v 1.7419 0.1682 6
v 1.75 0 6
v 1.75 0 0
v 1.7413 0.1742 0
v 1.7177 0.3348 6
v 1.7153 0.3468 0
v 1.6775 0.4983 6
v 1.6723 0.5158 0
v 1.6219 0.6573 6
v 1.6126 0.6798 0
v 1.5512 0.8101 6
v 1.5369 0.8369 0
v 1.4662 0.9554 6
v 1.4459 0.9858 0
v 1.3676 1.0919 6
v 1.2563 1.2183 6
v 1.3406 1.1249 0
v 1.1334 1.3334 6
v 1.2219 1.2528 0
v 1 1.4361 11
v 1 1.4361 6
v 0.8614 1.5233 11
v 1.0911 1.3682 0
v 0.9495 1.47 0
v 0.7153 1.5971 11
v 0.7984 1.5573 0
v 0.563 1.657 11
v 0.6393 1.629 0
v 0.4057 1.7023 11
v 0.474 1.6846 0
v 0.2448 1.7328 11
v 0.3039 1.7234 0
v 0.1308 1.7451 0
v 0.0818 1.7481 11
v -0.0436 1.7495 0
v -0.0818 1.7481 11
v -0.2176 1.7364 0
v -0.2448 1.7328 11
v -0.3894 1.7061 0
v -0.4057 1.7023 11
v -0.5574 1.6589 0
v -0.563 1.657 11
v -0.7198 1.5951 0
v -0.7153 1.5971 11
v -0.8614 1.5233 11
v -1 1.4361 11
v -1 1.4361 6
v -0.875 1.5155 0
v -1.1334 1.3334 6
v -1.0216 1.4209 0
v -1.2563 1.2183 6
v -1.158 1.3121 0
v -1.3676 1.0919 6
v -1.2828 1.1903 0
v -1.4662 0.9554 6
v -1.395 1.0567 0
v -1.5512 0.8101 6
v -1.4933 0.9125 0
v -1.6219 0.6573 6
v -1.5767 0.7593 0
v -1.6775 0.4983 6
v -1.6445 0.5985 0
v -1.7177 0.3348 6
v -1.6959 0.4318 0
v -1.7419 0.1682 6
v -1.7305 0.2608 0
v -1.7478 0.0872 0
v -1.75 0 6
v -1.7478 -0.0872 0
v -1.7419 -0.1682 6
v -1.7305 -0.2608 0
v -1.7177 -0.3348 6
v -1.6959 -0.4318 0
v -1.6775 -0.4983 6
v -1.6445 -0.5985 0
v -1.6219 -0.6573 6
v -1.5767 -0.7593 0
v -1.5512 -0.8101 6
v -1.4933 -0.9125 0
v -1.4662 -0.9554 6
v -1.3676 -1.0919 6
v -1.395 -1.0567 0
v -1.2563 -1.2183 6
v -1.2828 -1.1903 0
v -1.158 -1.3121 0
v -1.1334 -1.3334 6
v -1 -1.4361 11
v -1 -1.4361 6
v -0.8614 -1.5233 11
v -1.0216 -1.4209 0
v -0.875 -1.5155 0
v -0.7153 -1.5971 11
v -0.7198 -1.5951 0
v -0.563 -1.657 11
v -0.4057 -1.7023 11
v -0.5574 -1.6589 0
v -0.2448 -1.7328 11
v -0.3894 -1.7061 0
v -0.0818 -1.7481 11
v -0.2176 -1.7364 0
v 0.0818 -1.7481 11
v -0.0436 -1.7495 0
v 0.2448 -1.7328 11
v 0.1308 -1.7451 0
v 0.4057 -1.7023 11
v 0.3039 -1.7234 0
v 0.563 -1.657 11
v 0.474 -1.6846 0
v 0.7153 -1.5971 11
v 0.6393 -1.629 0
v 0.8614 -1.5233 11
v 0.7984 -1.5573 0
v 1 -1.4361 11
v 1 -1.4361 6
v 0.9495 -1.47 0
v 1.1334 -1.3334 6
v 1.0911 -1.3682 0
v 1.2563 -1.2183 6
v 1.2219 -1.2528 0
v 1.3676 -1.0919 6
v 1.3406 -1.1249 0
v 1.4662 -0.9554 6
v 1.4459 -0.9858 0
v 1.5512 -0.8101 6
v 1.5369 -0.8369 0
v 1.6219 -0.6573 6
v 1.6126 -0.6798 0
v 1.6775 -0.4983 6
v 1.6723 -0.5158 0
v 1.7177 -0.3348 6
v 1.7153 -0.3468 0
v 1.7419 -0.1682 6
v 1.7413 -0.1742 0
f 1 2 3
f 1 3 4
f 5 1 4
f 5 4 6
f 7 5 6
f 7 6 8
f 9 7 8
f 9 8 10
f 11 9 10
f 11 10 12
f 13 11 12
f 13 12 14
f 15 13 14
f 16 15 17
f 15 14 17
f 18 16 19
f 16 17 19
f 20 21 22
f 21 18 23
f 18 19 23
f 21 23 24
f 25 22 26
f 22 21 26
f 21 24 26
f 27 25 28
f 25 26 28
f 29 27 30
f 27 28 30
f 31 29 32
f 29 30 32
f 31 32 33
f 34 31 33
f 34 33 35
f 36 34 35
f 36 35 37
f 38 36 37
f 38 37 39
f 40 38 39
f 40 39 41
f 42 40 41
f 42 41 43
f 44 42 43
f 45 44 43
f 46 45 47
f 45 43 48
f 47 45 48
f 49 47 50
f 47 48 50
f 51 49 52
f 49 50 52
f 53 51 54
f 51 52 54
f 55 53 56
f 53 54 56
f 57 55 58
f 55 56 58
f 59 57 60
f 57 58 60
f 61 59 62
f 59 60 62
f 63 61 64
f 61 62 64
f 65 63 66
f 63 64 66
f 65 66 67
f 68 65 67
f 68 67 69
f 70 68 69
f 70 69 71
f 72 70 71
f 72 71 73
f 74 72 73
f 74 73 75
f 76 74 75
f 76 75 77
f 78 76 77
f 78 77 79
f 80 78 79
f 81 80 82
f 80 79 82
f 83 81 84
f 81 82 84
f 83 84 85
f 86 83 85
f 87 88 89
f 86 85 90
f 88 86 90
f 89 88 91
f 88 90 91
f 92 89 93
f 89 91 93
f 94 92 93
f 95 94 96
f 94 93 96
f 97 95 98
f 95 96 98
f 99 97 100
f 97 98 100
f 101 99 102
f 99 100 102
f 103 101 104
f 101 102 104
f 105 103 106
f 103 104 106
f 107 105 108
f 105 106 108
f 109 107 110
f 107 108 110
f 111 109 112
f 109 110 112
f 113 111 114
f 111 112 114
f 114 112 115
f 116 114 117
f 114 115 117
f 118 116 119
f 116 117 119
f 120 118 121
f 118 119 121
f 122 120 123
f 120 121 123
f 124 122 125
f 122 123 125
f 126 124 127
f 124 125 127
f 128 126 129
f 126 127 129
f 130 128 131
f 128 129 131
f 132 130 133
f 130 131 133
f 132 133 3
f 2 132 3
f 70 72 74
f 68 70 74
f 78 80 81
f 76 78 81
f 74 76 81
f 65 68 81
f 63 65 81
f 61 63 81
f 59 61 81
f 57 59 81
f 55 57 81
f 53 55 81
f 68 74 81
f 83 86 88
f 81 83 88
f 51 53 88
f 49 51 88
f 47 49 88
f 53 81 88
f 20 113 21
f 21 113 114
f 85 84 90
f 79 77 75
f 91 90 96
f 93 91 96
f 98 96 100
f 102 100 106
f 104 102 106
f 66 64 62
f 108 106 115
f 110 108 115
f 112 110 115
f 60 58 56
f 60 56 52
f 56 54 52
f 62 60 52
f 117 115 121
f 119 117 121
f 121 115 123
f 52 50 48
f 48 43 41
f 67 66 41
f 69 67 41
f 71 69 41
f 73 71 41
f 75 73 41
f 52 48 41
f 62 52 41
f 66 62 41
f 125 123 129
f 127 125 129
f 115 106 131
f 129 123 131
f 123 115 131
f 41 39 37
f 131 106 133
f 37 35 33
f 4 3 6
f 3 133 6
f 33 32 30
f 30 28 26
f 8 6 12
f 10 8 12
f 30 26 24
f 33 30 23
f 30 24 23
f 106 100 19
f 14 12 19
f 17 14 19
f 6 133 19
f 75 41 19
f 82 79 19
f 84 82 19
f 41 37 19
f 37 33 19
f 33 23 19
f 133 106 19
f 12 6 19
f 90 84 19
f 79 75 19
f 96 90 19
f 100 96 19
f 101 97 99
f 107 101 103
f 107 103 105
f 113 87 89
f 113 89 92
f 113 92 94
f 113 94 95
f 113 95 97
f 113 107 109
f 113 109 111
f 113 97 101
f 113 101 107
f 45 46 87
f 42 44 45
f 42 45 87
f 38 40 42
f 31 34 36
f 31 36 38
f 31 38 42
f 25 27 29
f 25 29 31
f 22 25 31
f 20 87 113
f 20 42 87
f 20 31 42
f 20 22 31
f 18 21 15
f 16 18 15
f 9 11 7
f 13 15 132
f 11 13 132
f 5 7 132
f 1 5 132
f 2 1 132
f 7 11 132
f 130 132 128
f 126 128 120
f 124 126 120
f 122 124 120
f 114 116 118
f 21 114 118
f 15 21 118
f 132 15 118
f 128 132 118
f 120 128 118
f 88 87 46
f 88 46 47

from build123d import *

# Parameters (mm, degrees)
CROQUIS1_R                 = 1.75
SALIENTE_EXTRUIR1_DEPTH    = 11
CORTAR_EXTRUIR1_DEPTH      = 1.75
CORTAR_EXTRUIR1_DEPTH_BACK = 1.75
CROQUIS2_W                 = 0.75
CROQUIS2_H                 = 5


with BuildPart() as part:
    # Croquis1 → Saliente-Extruir1 (new body)
    with BuildSketch(Plane.XY):
        Circle(CROQUIS1_R)
    extrude(amount=SALIENTE_EXTRUIR1_DEPTH)

    # Croquis2 → Cortar-Extruir1 (cut, two sides: drawn at the far end of the back side and taken through both)
    with BuildSketch(Plane(origin=(0, 0, 0), x_dir=(1, 0, 0), z_dir=(0, 1, 0)).offset(-CORTAR_EXTRUIR1_DEPTH_BACK)):
        with Locations((-1.375, -8.5)):
            Rectangle(CROQUIS2_W, CROQUIS2_H)
        with Locations((1.375, -8.5)):
            Rectangle(CROQUIS2_W, CROQUIS2_H)
    extrude(amount=CORTAR_EXTRUIR1_DEPTH + CORTAR_EXTRUIR1_DEPTH_BACK, mode=Mode.SUBTRACT)


solid = part.part
